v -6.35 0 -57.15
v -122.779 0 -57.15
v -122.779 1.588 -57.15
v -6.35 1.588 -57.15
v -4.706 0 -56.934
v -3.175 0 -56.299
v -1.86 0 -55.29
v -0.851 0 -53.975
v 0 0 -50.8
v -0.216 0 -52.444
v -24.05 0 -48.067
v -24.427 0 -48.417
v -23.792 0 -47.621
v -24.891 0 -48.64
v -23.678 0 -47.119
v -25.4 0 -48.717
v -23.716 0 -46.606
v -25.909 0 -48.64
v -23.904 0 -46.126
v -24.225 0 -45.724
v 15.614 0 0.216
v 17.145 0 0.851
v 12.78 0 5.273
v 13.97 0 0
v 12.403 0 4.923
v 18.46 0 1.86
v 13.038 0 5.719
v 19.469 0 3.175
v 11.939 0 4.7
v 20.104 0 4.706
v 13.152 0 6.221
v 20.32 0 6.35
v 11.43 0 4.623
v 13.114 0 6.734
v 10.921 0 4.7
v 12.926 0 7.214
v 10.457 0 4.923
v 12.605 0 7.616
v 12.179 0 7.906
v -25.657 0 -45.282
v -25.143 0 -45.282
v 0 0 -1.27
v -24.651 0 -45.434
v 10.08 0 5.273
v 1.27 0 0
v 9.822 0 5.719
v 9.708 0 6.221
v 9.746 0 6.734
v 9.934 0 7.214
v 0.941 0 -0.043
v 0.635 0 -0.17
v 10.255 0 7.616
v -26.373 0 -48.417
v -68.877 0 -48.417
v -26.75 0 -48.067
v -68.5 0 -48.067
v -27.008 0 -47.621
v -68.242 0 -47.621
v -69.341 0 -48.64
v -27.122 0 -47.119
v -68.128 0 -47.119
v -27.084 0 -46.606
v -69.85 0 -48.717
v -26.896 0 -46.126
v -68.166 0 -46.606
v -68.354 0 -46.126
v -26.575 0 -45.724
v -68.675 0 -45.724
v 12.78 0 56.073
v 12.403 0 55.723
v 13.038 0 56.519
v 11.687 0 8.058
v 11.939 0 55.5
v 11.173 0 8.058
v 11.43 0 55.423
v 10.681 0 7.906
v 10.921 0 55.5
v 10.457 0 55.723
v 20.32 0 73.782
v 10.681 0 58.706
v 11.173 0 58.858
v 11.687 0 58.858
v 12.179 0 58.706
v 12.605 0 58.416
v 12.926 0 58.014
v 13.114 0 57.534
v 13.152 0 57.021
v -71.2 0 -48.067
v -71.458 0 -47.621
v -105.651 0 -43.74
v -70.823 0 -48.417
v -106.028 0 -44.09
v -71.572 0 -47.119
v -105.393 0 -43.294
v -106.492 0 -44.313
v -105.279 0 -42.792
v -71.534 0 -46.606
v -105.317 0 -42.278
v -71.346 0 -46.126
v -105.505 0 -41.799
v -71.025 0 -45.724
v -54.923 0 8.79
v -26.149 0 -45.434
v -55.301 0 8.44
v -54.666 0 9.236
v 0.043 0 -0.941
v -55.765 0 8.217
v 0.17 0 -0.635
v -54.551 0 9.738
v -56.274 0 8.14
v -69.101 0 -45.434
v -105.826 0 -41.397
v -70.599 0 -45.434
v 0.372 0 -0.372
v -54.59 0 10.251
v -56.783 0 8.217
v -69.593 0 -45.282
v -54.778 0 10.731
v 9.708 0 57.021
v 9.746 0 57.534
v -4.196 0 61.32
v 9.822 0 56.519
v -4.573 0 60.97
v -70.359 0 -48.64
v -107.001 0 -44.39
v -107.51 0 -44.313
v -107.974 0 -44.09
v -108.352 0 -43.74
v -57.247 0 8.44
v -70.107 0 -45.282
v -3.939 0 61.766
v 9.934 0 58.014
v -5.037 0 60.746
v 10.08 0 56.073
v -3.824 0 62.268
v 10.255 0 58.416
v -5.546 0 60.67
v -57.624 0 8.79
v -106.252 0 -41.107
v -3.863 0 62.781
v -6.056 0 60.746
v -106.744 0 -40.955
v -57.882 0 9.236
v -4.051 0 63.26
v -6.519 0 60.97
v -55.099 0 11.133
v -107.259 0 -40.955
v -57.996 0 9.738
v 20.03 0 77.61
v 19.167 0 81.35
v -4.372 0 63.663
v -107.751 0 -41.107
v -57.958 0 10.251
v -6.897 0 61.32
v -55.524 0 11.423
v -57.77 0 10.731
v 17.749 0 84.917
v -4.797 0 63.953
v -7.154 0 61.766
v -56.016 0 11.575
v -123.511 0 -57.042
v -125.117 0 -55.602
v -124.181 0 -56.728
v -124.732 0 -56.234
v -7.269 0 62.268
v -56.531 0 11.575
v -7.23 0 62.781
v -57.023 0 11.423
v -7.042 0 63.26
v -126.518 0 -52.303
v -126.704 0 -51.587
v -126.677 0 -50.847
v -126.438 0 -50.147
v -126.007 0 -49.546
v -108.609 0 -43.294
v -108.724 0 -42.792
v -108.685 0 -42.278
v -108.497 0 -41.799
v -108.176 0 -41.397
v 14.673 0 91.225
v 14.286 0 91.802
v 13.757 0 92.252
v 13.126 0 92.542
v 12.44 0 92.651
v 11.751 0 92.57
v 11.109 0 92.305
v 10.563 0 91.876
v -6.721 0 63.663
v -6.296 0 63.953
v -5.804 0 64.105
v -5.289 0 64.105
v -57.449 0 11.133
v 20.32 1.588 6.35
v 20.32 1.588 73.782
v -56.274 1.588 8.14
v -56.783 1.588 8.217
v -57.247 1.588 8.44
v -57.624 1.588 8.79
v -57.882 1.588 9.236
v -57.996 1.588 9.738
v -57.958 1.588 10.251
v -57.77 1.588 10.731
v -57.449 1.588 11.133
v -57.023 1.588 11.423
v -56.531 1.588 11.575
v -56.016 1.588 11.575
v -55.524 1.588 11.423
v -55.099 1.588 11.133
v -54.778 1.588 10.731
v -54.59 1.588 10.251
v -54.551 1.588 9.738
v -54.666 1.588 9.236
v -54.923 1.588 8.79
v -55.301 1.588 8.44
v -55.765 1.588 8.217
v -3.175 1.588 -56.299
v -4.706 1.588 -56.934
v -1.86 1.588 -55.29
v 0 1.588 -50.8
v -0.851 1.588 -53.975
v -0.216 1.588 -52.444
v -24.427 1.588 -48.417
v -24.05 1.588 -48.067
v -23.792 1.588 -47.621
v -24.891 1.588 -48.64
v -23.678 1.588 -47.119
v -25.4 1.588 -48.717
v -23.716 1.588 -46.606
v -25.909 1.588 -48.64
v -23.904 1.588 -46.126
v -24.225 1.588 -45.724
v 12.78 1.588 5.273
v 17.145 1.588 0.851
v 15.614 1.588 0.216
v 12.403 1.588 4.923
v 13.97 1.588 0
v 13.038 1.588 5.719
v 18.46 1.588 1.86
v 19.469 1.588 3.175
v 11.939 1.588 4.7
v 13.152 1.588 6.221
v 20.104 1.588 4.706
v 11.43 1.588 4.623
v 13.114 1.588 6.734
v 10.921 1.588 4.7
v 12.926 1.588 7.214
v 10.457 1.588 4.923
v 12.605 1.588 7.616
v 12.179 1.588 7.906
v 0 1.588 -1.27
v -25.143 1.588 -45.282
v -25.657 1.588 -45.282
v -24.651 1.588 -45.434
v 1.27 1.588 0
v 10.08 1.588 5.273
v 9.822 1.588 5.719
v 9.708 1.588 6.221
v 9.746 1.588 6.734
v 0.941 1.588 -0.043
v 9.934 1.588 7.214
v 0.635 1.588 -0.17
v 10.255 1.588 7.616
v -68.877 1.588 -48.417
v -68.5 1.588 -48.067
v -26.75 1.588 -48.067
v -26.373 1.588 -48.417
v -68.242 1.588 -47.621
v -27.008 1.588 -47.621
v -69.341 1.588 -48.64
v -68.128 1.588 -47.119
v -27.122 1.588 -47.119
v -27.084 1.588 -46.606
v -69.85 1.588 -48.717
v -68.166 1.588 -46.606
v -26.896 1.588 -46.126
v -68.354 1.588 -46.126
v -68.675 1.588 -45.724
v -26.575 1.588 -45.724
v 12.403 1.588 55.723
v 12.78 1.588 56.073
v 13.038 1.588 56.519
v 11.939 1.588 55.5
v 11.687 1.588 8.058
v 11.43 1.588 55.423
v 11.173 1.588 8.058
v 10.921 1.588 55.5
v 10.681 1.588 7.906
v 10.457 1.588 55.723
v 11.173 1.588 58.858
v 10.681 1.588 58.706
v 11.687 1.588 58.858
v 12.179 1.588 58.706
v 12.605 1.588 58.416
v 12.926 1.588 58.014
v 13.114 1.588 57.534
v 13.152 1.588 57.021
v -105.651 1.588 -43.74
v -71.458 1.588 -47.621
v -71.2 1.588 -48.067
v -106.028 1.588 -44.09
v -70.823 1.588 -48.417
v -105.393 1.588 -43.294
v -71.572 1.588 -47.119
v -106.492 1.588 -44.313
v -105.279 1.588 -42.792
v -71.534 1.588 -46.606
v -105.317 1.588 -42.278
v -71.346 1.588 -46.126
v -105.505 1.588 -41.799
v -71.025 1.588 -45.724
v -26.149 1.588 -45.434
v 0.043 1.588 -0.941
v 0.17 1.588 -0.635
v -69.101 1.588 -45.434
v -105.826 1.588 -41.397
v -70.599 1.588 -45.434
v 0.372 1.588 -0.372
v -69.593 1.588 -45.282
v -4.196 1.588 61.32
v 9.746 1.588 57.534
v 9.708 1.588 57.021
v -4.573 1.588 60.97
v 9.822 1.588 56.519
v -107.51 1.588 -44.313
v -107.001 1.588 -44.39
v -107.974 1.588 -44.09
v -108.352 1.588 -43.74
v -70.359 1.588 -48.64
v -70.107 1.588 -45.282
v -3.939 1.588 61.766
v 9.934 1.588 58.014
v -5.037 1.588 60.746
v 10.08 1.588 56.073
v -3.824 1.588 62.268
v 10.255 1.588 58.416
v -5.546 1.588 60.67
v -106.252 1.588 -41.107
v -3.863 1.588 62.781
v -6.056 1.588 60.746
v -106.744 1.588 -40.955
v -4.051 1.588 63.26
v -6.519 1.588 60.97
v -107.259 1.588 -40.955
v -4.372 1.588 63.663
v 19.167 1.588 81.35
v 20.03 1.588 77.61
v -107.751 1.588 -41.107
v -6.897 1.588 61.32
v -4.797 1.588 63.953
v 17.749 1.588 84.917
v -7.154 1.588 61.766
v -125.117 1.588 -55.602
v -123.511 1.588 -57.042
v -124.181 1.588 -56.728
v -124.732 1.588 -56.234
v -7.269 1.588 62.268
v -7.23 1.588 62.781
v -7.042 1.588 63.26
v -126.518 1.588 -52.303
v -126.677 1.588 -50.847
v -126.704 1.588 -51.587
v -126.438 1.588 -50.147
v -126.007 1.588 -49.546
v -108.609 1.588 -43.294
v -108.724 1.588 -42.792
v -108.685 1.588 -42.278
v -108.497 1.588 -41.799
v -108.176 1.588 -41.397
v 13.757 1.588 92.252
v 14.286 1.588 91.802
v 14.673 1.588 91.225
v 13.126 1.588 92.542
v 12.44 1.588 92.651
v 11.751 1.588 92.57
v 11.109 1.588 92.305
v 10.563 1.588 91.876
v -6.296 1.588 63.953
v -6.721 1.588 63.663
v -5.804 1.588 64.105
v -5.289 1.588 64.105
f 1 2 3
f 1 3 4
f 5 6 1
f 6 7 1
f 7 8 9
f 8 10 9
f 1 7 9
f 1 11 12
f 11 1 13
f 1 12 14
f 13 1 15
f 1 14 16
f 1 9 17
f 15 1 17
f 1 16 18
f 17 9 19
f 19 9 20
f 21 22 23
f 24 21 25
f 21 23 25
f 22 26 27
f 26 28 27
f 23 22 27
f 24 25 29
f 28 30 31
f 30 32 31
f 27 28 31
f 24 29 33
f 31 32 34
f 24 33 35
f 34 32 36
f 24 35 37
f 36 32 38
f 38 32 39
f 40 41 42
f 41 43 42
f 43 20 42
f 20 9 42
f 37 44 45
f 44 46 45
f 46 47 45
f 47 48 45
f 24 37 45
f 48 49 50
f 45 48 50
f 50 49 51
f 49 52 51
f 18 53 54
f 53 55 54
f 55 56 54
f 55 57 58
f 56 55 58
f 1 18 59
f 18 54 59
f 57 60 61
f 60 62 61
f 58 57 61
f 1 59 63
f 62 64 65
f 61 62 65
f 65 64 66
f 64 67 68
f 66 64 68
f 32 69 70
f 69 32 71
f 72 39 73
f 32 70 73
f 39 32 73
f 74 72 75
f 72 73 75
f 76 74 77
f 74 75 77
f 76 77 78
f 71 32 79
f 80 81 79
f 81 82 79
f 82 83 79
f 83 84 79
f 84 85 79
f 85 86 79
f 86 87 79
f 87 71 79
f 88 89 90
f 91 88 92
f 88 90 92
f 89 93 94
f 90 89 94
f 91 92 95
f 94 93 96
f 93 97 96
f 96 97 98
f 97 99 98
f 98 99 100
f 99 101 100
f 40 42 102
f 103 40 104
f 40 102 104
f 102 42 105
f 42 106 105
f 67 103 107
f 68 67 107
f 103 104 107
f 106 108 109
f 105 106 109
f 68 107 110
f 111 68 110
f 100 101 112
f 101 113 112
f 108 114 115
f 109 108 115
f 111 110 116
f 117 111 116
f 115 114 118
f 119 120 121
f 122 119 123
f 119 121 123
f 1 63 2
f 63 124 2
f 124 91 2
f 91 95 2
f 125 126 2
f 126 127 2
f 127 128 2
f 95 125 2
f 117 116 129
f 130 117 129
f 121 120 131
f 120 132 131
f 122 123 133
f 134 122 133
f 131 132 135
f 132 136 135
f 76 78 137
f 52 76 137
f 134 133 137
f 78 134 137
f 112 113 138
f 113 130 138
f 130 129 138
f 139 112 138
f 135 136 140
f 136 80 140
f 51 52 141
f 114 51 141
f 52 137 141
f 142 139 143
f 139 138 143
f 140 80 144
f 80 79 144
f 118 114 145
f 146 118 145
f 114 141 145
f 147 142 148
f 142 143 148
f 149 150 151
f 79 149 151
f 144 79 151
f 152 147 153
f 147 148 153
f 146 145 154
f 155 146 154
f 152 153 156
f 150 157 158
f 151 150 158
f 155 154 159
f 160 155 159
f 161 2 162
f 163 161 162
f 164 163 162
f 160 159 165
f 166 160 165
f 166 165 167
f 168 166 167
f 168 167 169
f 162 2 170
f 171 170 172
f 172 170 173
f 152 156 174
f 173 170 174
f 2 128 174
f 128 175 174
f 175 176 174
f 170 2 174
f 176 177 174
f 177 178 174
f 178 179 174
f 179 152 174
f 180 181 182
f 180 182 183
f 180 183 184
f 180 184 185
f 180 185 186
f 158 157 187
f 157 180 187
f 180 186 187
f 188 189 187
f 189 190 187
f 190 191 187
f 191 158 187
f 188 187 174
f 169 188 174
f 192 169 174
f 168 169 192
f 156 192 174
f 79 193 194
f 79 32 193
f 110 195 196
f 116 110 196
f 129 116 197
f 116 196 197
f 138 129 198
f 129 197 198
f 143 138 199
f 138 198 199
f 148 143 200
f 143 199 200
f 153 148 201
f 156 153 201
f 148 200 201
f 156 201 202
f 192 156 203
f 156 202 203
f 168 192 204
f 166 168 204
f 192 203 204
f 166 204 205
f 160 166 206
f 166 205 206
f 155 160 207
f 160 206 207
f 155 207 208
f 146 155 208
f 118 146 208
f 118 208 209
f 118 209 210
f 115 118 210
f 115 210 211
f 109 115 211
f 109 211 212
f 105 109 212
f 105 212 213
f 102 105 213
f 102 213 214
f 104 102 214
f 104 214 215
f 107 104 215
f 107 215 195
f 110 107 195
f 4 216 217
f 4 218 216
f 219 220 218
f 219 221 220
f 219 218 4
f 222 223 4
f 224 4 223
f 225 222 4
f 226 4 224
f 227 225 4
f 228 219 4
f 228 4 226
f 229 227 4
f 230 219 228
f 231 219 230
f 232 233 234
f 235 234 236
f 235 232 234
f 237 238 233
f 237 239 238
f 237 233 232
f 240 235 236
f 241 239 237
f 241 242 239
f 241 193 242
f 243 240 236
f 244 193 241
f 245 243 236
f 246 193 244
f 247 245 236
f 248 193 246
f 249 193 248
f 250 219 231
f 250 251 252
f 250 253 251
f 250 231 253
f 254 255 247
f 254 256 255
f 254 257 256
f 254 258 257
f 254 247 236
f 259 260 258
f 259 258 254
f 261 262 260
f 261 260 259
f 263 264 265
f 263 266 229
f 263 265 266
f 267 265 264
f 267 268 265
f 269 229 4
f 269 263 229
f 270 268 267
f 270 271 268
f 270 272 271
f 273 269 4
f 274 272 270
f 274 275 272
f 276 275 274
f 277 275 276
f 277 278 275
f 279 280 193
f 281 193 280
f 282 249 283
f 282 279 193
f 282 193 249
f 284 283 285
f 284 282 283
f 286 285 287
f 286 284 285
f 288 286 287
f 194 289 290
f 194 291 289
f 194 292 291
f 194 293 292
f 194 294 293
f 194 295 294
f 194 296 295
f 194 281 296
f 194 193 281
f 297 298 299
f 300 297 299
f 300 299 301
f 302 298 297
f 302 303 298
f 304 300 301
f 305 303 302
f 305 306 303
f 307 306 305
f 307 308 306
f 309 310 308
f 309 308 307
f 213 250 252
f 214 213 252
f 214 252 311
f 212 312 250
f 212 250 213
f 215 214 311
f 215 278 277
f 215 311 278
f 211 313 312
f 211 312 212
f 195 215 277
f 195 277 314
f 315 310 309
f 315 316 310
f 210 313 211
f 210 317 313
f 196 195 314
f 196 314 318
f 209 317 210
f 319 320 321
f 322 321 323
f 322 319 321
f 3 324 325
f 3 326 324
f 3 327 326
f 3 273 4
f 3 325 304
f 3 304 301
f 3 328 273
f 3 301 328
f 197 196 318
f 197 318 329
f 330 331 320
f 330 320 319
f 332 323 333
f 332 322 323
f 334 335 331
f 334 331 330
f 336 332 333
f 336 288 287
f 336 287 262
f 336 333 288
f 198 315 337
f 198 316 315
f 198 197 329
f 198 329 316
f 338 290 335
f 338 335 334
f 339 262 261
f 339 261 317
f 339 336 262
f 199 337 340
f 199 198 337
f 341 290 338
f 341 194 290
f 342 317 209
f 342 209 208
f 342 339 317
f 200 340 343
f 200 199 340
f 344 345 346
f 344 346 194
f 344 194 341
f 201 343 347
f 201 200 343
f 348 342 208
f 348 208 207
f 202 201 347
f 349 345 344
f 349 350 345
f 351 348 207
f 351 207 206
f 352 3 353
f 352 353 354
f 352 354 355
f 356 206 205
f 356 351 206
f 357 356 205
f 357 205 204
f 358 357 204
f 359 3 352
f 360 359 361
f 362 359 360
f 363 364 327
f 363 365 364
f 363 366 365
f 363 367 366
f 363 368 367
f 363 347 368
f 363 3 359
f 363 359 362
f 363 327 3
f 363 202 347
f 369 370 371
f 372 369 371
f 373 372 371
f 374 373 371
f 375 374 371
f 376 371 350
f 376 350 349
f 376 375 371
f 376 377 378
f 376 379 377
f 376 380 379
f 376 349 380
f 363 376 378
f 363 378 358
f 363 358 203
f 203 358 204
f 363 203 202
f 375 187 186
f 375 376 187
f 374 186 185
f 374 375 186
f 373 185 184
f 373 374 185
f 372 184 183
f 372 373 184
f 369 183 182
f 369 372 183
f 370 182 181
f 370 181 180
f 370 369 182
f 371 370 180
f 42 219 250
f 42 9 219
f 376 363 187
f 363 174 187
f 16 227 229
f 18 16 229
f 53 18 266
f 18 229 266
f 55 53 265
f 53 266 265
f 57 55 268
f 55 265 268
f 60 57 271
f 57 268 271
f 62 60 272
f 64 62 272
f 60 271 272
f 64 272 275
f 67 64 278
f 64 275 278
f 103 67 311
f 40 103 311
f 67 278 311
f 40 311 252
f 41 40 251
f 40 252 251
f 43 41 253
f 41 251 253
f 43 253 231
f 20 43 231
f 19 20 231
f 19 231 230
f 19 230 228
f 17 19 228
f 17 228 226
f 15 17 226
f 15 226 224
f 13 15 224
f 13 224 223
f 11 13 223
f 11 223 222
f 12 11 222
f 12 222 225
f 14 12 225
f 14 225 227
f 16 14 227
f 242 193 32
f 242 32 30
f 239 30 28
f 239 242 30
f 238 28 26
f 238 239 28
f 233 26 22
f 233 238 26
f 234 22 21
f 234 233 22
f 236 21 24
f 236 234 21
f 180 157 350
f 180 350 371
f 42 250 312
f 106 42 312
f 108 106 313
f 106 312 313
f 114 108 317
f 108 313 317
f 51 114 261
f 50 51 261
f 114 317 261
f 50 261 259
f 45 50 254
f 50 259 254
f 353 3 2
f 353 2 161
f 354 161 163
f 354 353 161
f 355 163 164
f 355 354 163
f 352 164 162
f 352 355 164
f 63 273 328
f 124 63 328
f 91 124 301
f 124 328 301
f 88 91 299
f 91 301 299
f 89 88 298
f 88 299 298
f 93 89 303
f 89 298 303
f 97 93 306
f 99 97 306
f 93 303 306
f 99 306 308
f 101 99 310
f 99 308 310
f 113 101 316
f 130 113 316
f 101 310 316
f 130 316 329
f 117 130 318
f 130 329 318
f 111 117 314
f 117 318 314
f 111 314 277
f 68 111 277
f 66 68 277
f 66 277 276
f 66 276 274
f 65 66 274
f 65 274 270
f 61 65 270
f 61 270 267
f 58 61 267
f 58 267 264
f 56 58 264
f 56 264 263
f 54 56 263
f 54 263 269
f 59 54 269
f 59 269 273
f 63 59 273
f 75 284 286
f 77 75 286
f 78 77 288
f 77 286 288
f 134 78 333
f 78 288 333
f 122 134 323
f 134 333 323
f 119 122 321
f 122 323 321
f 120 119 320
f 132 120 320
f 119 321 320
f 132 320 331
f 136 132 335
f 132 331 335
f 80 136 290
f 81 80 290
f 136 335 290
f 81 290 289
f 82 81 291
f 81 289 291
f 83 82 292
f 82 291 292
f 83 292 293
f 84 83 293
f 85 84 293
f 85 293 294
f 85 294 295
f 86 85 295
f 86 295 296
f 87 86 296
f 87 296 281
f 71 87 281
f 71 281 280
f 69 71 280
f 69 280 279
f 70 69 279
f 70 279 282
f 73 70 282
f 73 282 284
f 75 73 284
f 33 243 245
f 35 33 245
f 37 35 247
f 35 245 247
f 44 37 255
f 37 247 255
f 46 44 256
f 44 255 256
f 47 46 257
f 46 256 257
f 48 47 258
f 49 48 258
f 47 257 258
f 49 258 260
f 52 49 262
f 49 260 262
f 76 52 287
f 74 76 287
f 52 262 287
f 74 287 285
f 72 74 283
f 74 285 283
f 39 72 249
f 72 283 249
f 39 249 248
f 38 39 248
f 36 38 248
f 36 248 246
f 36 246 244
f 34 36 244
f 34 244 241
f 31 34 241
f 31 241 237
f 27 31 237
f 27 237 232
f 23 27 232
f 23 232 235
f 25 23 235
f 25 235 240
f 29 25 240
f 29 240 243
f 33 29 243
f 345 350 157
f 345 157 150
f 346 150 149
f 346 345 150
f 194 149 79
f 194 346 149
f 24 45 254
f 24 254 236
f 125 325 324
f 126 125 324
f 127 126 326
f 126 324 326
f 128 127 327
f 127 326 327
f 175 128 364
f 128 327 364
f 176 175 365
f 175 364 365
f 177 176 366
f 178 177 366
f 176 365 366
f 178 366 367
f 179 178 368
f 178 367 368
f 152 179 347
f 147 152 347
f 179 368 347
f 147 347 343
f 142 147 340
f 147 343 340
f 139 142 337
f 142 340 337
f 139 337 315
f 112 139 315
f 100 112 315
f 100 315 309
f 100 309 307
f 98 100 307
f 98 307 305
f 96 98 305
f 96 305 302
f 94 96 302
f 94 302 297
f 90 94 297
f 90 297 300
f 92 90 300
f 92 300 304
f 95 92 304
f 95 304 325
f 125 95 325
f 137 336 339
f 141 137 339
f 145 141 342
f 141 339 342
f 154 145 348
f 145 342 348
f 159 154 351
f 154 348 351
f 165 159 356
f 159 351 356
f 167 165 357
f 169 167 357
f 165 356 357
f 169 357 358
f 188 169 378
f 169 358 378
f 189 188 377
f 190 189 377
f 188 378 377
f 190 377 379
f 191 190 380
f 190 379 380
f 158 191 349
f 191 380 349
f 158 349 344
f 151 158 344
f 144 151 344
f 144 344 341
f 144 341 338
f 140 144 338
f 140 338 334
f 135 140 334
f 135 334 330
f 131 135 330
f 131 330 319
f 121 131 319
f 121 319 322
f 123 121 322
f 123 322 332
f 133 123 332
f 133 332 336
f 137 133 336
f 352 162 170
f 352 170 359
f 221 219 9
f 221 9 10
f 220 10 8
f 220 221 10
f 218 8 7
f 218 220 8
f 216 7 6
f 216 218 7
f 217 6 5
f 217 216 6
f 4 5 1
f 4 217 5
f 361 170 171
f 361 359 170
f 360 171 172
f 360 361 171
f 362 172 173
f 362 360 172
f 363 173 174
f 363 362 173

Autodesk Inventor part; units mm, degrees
ref_plane "YZ Plane" through (0, 0, 0) normal (1, 0, 0) x (0, 1, 0)
ref_plane "XZ Plane" through (0, 0, 0) normal (0, 1, 0) x (-1, 0, 0)
ref_plane "XY Plane" through (0, 0, 0) normal (0, 0, 1) x (1, 0, 0)
sketch "Sketch1" plane through (0, 0, 0) normal (0, 1, 0) x (-1, 0, 0)
  line L0 (0, 0) -> (-20.32, 0)
  line L1 (-20.32, 0) -> (-20.32, 79.6462)
  line L2 (-20.32, 79.6462) -> (-13.0825, 94.4853)
  line L3 (133.35, -57.15) -> (0, -57.15)
  line L4 (0, -57.15) -> (0, 0)
  line L5 (25.4, -46.99) -> (69.85, -46.99) construction
  line L6 (107.0012, -42.6627) -> (5.5464, 62.3969) construction
  line L7 (-11.43, 57.15) -> (-11.43, 6.35) construction
  line L8 (164.084, 0) -> (-51.054, 0) construction
  line L9 (133.35, -57.15) -> (-13.0825, 94.4853)
  line L10 (107.0012, -42.6627) -> (113.3962, -36.4872) construction
  point P0 (56.2738, 9.8671)
  dimension "d25" = 50.8
  dimension "d26" = 146.05
  dimension "d27" = 73.025
  dimension "d28" = 44.45
  dimension "d32" = 57.15
  dimension "d33" = 133.35
  dimension "d44" = 20.32
  dimension "d46" = 8.89
  dimension "d47" = 10.16
  dimension "d49" = 25.4
  dimension "d60" = 46
  dimension "d61" = 8.89
  dimension "d64" = 6.35
  dimension "d66" = 28.7247
  dimension "d71" = 70
  dimension "d72" = 16.51
extrude "Plate1" add sketch "Sketch1" along normal blind 1.5875
hole "Hole1" at (-5.5464, 0, 62.3969) at (11.43, 0, 57.15) at (-56.2738, 0, 9.8671) at (-107.0012, 0, -42.6627) at (-69.85, 0, -46.99) at (-25.4, 0, -46.99) at (11.43, 0, 6.35) direction (0, 1, 0) diameter 3.4544 end through all
chamfer "Corner Chamfer1" distance 8.89 angle 45 1 edges at (-133.35, 0.7937, -57.15)
fillet "Corner Round1" radius 6.35 2 edges at (20.32, 0.7937, 0) (0, 0.7937, -57.15)
fillet "Corner Round1" radius 2.54 3 edges at (13.0825, 0.7937, 94.4853) (-127.1745, 0.7937, -50.7551) (-124.46, 0.7937, -57.15)
fillet "Corner Round1" radius 1.27 1 edges at (0, 0.7937, 0)
fillet "Corner Round1" radius 25.4 1 edges at (20.32, 0.7937, 79.6462)
equation "\"d27\" = 0.5 * d26"
equation "\"BendReliefWidth\" = Thickness"
equation "\"BendReliefDepth\" = 0.5 * Thickness"
equation "\"MinimumRemnant\" = 2 * Thickness"
equation "\"GapSize\" = Thickness"
equation "\"Thickness\" = 1.5875"
properties part number "J009838" material "Polycarbonate, Clear"
